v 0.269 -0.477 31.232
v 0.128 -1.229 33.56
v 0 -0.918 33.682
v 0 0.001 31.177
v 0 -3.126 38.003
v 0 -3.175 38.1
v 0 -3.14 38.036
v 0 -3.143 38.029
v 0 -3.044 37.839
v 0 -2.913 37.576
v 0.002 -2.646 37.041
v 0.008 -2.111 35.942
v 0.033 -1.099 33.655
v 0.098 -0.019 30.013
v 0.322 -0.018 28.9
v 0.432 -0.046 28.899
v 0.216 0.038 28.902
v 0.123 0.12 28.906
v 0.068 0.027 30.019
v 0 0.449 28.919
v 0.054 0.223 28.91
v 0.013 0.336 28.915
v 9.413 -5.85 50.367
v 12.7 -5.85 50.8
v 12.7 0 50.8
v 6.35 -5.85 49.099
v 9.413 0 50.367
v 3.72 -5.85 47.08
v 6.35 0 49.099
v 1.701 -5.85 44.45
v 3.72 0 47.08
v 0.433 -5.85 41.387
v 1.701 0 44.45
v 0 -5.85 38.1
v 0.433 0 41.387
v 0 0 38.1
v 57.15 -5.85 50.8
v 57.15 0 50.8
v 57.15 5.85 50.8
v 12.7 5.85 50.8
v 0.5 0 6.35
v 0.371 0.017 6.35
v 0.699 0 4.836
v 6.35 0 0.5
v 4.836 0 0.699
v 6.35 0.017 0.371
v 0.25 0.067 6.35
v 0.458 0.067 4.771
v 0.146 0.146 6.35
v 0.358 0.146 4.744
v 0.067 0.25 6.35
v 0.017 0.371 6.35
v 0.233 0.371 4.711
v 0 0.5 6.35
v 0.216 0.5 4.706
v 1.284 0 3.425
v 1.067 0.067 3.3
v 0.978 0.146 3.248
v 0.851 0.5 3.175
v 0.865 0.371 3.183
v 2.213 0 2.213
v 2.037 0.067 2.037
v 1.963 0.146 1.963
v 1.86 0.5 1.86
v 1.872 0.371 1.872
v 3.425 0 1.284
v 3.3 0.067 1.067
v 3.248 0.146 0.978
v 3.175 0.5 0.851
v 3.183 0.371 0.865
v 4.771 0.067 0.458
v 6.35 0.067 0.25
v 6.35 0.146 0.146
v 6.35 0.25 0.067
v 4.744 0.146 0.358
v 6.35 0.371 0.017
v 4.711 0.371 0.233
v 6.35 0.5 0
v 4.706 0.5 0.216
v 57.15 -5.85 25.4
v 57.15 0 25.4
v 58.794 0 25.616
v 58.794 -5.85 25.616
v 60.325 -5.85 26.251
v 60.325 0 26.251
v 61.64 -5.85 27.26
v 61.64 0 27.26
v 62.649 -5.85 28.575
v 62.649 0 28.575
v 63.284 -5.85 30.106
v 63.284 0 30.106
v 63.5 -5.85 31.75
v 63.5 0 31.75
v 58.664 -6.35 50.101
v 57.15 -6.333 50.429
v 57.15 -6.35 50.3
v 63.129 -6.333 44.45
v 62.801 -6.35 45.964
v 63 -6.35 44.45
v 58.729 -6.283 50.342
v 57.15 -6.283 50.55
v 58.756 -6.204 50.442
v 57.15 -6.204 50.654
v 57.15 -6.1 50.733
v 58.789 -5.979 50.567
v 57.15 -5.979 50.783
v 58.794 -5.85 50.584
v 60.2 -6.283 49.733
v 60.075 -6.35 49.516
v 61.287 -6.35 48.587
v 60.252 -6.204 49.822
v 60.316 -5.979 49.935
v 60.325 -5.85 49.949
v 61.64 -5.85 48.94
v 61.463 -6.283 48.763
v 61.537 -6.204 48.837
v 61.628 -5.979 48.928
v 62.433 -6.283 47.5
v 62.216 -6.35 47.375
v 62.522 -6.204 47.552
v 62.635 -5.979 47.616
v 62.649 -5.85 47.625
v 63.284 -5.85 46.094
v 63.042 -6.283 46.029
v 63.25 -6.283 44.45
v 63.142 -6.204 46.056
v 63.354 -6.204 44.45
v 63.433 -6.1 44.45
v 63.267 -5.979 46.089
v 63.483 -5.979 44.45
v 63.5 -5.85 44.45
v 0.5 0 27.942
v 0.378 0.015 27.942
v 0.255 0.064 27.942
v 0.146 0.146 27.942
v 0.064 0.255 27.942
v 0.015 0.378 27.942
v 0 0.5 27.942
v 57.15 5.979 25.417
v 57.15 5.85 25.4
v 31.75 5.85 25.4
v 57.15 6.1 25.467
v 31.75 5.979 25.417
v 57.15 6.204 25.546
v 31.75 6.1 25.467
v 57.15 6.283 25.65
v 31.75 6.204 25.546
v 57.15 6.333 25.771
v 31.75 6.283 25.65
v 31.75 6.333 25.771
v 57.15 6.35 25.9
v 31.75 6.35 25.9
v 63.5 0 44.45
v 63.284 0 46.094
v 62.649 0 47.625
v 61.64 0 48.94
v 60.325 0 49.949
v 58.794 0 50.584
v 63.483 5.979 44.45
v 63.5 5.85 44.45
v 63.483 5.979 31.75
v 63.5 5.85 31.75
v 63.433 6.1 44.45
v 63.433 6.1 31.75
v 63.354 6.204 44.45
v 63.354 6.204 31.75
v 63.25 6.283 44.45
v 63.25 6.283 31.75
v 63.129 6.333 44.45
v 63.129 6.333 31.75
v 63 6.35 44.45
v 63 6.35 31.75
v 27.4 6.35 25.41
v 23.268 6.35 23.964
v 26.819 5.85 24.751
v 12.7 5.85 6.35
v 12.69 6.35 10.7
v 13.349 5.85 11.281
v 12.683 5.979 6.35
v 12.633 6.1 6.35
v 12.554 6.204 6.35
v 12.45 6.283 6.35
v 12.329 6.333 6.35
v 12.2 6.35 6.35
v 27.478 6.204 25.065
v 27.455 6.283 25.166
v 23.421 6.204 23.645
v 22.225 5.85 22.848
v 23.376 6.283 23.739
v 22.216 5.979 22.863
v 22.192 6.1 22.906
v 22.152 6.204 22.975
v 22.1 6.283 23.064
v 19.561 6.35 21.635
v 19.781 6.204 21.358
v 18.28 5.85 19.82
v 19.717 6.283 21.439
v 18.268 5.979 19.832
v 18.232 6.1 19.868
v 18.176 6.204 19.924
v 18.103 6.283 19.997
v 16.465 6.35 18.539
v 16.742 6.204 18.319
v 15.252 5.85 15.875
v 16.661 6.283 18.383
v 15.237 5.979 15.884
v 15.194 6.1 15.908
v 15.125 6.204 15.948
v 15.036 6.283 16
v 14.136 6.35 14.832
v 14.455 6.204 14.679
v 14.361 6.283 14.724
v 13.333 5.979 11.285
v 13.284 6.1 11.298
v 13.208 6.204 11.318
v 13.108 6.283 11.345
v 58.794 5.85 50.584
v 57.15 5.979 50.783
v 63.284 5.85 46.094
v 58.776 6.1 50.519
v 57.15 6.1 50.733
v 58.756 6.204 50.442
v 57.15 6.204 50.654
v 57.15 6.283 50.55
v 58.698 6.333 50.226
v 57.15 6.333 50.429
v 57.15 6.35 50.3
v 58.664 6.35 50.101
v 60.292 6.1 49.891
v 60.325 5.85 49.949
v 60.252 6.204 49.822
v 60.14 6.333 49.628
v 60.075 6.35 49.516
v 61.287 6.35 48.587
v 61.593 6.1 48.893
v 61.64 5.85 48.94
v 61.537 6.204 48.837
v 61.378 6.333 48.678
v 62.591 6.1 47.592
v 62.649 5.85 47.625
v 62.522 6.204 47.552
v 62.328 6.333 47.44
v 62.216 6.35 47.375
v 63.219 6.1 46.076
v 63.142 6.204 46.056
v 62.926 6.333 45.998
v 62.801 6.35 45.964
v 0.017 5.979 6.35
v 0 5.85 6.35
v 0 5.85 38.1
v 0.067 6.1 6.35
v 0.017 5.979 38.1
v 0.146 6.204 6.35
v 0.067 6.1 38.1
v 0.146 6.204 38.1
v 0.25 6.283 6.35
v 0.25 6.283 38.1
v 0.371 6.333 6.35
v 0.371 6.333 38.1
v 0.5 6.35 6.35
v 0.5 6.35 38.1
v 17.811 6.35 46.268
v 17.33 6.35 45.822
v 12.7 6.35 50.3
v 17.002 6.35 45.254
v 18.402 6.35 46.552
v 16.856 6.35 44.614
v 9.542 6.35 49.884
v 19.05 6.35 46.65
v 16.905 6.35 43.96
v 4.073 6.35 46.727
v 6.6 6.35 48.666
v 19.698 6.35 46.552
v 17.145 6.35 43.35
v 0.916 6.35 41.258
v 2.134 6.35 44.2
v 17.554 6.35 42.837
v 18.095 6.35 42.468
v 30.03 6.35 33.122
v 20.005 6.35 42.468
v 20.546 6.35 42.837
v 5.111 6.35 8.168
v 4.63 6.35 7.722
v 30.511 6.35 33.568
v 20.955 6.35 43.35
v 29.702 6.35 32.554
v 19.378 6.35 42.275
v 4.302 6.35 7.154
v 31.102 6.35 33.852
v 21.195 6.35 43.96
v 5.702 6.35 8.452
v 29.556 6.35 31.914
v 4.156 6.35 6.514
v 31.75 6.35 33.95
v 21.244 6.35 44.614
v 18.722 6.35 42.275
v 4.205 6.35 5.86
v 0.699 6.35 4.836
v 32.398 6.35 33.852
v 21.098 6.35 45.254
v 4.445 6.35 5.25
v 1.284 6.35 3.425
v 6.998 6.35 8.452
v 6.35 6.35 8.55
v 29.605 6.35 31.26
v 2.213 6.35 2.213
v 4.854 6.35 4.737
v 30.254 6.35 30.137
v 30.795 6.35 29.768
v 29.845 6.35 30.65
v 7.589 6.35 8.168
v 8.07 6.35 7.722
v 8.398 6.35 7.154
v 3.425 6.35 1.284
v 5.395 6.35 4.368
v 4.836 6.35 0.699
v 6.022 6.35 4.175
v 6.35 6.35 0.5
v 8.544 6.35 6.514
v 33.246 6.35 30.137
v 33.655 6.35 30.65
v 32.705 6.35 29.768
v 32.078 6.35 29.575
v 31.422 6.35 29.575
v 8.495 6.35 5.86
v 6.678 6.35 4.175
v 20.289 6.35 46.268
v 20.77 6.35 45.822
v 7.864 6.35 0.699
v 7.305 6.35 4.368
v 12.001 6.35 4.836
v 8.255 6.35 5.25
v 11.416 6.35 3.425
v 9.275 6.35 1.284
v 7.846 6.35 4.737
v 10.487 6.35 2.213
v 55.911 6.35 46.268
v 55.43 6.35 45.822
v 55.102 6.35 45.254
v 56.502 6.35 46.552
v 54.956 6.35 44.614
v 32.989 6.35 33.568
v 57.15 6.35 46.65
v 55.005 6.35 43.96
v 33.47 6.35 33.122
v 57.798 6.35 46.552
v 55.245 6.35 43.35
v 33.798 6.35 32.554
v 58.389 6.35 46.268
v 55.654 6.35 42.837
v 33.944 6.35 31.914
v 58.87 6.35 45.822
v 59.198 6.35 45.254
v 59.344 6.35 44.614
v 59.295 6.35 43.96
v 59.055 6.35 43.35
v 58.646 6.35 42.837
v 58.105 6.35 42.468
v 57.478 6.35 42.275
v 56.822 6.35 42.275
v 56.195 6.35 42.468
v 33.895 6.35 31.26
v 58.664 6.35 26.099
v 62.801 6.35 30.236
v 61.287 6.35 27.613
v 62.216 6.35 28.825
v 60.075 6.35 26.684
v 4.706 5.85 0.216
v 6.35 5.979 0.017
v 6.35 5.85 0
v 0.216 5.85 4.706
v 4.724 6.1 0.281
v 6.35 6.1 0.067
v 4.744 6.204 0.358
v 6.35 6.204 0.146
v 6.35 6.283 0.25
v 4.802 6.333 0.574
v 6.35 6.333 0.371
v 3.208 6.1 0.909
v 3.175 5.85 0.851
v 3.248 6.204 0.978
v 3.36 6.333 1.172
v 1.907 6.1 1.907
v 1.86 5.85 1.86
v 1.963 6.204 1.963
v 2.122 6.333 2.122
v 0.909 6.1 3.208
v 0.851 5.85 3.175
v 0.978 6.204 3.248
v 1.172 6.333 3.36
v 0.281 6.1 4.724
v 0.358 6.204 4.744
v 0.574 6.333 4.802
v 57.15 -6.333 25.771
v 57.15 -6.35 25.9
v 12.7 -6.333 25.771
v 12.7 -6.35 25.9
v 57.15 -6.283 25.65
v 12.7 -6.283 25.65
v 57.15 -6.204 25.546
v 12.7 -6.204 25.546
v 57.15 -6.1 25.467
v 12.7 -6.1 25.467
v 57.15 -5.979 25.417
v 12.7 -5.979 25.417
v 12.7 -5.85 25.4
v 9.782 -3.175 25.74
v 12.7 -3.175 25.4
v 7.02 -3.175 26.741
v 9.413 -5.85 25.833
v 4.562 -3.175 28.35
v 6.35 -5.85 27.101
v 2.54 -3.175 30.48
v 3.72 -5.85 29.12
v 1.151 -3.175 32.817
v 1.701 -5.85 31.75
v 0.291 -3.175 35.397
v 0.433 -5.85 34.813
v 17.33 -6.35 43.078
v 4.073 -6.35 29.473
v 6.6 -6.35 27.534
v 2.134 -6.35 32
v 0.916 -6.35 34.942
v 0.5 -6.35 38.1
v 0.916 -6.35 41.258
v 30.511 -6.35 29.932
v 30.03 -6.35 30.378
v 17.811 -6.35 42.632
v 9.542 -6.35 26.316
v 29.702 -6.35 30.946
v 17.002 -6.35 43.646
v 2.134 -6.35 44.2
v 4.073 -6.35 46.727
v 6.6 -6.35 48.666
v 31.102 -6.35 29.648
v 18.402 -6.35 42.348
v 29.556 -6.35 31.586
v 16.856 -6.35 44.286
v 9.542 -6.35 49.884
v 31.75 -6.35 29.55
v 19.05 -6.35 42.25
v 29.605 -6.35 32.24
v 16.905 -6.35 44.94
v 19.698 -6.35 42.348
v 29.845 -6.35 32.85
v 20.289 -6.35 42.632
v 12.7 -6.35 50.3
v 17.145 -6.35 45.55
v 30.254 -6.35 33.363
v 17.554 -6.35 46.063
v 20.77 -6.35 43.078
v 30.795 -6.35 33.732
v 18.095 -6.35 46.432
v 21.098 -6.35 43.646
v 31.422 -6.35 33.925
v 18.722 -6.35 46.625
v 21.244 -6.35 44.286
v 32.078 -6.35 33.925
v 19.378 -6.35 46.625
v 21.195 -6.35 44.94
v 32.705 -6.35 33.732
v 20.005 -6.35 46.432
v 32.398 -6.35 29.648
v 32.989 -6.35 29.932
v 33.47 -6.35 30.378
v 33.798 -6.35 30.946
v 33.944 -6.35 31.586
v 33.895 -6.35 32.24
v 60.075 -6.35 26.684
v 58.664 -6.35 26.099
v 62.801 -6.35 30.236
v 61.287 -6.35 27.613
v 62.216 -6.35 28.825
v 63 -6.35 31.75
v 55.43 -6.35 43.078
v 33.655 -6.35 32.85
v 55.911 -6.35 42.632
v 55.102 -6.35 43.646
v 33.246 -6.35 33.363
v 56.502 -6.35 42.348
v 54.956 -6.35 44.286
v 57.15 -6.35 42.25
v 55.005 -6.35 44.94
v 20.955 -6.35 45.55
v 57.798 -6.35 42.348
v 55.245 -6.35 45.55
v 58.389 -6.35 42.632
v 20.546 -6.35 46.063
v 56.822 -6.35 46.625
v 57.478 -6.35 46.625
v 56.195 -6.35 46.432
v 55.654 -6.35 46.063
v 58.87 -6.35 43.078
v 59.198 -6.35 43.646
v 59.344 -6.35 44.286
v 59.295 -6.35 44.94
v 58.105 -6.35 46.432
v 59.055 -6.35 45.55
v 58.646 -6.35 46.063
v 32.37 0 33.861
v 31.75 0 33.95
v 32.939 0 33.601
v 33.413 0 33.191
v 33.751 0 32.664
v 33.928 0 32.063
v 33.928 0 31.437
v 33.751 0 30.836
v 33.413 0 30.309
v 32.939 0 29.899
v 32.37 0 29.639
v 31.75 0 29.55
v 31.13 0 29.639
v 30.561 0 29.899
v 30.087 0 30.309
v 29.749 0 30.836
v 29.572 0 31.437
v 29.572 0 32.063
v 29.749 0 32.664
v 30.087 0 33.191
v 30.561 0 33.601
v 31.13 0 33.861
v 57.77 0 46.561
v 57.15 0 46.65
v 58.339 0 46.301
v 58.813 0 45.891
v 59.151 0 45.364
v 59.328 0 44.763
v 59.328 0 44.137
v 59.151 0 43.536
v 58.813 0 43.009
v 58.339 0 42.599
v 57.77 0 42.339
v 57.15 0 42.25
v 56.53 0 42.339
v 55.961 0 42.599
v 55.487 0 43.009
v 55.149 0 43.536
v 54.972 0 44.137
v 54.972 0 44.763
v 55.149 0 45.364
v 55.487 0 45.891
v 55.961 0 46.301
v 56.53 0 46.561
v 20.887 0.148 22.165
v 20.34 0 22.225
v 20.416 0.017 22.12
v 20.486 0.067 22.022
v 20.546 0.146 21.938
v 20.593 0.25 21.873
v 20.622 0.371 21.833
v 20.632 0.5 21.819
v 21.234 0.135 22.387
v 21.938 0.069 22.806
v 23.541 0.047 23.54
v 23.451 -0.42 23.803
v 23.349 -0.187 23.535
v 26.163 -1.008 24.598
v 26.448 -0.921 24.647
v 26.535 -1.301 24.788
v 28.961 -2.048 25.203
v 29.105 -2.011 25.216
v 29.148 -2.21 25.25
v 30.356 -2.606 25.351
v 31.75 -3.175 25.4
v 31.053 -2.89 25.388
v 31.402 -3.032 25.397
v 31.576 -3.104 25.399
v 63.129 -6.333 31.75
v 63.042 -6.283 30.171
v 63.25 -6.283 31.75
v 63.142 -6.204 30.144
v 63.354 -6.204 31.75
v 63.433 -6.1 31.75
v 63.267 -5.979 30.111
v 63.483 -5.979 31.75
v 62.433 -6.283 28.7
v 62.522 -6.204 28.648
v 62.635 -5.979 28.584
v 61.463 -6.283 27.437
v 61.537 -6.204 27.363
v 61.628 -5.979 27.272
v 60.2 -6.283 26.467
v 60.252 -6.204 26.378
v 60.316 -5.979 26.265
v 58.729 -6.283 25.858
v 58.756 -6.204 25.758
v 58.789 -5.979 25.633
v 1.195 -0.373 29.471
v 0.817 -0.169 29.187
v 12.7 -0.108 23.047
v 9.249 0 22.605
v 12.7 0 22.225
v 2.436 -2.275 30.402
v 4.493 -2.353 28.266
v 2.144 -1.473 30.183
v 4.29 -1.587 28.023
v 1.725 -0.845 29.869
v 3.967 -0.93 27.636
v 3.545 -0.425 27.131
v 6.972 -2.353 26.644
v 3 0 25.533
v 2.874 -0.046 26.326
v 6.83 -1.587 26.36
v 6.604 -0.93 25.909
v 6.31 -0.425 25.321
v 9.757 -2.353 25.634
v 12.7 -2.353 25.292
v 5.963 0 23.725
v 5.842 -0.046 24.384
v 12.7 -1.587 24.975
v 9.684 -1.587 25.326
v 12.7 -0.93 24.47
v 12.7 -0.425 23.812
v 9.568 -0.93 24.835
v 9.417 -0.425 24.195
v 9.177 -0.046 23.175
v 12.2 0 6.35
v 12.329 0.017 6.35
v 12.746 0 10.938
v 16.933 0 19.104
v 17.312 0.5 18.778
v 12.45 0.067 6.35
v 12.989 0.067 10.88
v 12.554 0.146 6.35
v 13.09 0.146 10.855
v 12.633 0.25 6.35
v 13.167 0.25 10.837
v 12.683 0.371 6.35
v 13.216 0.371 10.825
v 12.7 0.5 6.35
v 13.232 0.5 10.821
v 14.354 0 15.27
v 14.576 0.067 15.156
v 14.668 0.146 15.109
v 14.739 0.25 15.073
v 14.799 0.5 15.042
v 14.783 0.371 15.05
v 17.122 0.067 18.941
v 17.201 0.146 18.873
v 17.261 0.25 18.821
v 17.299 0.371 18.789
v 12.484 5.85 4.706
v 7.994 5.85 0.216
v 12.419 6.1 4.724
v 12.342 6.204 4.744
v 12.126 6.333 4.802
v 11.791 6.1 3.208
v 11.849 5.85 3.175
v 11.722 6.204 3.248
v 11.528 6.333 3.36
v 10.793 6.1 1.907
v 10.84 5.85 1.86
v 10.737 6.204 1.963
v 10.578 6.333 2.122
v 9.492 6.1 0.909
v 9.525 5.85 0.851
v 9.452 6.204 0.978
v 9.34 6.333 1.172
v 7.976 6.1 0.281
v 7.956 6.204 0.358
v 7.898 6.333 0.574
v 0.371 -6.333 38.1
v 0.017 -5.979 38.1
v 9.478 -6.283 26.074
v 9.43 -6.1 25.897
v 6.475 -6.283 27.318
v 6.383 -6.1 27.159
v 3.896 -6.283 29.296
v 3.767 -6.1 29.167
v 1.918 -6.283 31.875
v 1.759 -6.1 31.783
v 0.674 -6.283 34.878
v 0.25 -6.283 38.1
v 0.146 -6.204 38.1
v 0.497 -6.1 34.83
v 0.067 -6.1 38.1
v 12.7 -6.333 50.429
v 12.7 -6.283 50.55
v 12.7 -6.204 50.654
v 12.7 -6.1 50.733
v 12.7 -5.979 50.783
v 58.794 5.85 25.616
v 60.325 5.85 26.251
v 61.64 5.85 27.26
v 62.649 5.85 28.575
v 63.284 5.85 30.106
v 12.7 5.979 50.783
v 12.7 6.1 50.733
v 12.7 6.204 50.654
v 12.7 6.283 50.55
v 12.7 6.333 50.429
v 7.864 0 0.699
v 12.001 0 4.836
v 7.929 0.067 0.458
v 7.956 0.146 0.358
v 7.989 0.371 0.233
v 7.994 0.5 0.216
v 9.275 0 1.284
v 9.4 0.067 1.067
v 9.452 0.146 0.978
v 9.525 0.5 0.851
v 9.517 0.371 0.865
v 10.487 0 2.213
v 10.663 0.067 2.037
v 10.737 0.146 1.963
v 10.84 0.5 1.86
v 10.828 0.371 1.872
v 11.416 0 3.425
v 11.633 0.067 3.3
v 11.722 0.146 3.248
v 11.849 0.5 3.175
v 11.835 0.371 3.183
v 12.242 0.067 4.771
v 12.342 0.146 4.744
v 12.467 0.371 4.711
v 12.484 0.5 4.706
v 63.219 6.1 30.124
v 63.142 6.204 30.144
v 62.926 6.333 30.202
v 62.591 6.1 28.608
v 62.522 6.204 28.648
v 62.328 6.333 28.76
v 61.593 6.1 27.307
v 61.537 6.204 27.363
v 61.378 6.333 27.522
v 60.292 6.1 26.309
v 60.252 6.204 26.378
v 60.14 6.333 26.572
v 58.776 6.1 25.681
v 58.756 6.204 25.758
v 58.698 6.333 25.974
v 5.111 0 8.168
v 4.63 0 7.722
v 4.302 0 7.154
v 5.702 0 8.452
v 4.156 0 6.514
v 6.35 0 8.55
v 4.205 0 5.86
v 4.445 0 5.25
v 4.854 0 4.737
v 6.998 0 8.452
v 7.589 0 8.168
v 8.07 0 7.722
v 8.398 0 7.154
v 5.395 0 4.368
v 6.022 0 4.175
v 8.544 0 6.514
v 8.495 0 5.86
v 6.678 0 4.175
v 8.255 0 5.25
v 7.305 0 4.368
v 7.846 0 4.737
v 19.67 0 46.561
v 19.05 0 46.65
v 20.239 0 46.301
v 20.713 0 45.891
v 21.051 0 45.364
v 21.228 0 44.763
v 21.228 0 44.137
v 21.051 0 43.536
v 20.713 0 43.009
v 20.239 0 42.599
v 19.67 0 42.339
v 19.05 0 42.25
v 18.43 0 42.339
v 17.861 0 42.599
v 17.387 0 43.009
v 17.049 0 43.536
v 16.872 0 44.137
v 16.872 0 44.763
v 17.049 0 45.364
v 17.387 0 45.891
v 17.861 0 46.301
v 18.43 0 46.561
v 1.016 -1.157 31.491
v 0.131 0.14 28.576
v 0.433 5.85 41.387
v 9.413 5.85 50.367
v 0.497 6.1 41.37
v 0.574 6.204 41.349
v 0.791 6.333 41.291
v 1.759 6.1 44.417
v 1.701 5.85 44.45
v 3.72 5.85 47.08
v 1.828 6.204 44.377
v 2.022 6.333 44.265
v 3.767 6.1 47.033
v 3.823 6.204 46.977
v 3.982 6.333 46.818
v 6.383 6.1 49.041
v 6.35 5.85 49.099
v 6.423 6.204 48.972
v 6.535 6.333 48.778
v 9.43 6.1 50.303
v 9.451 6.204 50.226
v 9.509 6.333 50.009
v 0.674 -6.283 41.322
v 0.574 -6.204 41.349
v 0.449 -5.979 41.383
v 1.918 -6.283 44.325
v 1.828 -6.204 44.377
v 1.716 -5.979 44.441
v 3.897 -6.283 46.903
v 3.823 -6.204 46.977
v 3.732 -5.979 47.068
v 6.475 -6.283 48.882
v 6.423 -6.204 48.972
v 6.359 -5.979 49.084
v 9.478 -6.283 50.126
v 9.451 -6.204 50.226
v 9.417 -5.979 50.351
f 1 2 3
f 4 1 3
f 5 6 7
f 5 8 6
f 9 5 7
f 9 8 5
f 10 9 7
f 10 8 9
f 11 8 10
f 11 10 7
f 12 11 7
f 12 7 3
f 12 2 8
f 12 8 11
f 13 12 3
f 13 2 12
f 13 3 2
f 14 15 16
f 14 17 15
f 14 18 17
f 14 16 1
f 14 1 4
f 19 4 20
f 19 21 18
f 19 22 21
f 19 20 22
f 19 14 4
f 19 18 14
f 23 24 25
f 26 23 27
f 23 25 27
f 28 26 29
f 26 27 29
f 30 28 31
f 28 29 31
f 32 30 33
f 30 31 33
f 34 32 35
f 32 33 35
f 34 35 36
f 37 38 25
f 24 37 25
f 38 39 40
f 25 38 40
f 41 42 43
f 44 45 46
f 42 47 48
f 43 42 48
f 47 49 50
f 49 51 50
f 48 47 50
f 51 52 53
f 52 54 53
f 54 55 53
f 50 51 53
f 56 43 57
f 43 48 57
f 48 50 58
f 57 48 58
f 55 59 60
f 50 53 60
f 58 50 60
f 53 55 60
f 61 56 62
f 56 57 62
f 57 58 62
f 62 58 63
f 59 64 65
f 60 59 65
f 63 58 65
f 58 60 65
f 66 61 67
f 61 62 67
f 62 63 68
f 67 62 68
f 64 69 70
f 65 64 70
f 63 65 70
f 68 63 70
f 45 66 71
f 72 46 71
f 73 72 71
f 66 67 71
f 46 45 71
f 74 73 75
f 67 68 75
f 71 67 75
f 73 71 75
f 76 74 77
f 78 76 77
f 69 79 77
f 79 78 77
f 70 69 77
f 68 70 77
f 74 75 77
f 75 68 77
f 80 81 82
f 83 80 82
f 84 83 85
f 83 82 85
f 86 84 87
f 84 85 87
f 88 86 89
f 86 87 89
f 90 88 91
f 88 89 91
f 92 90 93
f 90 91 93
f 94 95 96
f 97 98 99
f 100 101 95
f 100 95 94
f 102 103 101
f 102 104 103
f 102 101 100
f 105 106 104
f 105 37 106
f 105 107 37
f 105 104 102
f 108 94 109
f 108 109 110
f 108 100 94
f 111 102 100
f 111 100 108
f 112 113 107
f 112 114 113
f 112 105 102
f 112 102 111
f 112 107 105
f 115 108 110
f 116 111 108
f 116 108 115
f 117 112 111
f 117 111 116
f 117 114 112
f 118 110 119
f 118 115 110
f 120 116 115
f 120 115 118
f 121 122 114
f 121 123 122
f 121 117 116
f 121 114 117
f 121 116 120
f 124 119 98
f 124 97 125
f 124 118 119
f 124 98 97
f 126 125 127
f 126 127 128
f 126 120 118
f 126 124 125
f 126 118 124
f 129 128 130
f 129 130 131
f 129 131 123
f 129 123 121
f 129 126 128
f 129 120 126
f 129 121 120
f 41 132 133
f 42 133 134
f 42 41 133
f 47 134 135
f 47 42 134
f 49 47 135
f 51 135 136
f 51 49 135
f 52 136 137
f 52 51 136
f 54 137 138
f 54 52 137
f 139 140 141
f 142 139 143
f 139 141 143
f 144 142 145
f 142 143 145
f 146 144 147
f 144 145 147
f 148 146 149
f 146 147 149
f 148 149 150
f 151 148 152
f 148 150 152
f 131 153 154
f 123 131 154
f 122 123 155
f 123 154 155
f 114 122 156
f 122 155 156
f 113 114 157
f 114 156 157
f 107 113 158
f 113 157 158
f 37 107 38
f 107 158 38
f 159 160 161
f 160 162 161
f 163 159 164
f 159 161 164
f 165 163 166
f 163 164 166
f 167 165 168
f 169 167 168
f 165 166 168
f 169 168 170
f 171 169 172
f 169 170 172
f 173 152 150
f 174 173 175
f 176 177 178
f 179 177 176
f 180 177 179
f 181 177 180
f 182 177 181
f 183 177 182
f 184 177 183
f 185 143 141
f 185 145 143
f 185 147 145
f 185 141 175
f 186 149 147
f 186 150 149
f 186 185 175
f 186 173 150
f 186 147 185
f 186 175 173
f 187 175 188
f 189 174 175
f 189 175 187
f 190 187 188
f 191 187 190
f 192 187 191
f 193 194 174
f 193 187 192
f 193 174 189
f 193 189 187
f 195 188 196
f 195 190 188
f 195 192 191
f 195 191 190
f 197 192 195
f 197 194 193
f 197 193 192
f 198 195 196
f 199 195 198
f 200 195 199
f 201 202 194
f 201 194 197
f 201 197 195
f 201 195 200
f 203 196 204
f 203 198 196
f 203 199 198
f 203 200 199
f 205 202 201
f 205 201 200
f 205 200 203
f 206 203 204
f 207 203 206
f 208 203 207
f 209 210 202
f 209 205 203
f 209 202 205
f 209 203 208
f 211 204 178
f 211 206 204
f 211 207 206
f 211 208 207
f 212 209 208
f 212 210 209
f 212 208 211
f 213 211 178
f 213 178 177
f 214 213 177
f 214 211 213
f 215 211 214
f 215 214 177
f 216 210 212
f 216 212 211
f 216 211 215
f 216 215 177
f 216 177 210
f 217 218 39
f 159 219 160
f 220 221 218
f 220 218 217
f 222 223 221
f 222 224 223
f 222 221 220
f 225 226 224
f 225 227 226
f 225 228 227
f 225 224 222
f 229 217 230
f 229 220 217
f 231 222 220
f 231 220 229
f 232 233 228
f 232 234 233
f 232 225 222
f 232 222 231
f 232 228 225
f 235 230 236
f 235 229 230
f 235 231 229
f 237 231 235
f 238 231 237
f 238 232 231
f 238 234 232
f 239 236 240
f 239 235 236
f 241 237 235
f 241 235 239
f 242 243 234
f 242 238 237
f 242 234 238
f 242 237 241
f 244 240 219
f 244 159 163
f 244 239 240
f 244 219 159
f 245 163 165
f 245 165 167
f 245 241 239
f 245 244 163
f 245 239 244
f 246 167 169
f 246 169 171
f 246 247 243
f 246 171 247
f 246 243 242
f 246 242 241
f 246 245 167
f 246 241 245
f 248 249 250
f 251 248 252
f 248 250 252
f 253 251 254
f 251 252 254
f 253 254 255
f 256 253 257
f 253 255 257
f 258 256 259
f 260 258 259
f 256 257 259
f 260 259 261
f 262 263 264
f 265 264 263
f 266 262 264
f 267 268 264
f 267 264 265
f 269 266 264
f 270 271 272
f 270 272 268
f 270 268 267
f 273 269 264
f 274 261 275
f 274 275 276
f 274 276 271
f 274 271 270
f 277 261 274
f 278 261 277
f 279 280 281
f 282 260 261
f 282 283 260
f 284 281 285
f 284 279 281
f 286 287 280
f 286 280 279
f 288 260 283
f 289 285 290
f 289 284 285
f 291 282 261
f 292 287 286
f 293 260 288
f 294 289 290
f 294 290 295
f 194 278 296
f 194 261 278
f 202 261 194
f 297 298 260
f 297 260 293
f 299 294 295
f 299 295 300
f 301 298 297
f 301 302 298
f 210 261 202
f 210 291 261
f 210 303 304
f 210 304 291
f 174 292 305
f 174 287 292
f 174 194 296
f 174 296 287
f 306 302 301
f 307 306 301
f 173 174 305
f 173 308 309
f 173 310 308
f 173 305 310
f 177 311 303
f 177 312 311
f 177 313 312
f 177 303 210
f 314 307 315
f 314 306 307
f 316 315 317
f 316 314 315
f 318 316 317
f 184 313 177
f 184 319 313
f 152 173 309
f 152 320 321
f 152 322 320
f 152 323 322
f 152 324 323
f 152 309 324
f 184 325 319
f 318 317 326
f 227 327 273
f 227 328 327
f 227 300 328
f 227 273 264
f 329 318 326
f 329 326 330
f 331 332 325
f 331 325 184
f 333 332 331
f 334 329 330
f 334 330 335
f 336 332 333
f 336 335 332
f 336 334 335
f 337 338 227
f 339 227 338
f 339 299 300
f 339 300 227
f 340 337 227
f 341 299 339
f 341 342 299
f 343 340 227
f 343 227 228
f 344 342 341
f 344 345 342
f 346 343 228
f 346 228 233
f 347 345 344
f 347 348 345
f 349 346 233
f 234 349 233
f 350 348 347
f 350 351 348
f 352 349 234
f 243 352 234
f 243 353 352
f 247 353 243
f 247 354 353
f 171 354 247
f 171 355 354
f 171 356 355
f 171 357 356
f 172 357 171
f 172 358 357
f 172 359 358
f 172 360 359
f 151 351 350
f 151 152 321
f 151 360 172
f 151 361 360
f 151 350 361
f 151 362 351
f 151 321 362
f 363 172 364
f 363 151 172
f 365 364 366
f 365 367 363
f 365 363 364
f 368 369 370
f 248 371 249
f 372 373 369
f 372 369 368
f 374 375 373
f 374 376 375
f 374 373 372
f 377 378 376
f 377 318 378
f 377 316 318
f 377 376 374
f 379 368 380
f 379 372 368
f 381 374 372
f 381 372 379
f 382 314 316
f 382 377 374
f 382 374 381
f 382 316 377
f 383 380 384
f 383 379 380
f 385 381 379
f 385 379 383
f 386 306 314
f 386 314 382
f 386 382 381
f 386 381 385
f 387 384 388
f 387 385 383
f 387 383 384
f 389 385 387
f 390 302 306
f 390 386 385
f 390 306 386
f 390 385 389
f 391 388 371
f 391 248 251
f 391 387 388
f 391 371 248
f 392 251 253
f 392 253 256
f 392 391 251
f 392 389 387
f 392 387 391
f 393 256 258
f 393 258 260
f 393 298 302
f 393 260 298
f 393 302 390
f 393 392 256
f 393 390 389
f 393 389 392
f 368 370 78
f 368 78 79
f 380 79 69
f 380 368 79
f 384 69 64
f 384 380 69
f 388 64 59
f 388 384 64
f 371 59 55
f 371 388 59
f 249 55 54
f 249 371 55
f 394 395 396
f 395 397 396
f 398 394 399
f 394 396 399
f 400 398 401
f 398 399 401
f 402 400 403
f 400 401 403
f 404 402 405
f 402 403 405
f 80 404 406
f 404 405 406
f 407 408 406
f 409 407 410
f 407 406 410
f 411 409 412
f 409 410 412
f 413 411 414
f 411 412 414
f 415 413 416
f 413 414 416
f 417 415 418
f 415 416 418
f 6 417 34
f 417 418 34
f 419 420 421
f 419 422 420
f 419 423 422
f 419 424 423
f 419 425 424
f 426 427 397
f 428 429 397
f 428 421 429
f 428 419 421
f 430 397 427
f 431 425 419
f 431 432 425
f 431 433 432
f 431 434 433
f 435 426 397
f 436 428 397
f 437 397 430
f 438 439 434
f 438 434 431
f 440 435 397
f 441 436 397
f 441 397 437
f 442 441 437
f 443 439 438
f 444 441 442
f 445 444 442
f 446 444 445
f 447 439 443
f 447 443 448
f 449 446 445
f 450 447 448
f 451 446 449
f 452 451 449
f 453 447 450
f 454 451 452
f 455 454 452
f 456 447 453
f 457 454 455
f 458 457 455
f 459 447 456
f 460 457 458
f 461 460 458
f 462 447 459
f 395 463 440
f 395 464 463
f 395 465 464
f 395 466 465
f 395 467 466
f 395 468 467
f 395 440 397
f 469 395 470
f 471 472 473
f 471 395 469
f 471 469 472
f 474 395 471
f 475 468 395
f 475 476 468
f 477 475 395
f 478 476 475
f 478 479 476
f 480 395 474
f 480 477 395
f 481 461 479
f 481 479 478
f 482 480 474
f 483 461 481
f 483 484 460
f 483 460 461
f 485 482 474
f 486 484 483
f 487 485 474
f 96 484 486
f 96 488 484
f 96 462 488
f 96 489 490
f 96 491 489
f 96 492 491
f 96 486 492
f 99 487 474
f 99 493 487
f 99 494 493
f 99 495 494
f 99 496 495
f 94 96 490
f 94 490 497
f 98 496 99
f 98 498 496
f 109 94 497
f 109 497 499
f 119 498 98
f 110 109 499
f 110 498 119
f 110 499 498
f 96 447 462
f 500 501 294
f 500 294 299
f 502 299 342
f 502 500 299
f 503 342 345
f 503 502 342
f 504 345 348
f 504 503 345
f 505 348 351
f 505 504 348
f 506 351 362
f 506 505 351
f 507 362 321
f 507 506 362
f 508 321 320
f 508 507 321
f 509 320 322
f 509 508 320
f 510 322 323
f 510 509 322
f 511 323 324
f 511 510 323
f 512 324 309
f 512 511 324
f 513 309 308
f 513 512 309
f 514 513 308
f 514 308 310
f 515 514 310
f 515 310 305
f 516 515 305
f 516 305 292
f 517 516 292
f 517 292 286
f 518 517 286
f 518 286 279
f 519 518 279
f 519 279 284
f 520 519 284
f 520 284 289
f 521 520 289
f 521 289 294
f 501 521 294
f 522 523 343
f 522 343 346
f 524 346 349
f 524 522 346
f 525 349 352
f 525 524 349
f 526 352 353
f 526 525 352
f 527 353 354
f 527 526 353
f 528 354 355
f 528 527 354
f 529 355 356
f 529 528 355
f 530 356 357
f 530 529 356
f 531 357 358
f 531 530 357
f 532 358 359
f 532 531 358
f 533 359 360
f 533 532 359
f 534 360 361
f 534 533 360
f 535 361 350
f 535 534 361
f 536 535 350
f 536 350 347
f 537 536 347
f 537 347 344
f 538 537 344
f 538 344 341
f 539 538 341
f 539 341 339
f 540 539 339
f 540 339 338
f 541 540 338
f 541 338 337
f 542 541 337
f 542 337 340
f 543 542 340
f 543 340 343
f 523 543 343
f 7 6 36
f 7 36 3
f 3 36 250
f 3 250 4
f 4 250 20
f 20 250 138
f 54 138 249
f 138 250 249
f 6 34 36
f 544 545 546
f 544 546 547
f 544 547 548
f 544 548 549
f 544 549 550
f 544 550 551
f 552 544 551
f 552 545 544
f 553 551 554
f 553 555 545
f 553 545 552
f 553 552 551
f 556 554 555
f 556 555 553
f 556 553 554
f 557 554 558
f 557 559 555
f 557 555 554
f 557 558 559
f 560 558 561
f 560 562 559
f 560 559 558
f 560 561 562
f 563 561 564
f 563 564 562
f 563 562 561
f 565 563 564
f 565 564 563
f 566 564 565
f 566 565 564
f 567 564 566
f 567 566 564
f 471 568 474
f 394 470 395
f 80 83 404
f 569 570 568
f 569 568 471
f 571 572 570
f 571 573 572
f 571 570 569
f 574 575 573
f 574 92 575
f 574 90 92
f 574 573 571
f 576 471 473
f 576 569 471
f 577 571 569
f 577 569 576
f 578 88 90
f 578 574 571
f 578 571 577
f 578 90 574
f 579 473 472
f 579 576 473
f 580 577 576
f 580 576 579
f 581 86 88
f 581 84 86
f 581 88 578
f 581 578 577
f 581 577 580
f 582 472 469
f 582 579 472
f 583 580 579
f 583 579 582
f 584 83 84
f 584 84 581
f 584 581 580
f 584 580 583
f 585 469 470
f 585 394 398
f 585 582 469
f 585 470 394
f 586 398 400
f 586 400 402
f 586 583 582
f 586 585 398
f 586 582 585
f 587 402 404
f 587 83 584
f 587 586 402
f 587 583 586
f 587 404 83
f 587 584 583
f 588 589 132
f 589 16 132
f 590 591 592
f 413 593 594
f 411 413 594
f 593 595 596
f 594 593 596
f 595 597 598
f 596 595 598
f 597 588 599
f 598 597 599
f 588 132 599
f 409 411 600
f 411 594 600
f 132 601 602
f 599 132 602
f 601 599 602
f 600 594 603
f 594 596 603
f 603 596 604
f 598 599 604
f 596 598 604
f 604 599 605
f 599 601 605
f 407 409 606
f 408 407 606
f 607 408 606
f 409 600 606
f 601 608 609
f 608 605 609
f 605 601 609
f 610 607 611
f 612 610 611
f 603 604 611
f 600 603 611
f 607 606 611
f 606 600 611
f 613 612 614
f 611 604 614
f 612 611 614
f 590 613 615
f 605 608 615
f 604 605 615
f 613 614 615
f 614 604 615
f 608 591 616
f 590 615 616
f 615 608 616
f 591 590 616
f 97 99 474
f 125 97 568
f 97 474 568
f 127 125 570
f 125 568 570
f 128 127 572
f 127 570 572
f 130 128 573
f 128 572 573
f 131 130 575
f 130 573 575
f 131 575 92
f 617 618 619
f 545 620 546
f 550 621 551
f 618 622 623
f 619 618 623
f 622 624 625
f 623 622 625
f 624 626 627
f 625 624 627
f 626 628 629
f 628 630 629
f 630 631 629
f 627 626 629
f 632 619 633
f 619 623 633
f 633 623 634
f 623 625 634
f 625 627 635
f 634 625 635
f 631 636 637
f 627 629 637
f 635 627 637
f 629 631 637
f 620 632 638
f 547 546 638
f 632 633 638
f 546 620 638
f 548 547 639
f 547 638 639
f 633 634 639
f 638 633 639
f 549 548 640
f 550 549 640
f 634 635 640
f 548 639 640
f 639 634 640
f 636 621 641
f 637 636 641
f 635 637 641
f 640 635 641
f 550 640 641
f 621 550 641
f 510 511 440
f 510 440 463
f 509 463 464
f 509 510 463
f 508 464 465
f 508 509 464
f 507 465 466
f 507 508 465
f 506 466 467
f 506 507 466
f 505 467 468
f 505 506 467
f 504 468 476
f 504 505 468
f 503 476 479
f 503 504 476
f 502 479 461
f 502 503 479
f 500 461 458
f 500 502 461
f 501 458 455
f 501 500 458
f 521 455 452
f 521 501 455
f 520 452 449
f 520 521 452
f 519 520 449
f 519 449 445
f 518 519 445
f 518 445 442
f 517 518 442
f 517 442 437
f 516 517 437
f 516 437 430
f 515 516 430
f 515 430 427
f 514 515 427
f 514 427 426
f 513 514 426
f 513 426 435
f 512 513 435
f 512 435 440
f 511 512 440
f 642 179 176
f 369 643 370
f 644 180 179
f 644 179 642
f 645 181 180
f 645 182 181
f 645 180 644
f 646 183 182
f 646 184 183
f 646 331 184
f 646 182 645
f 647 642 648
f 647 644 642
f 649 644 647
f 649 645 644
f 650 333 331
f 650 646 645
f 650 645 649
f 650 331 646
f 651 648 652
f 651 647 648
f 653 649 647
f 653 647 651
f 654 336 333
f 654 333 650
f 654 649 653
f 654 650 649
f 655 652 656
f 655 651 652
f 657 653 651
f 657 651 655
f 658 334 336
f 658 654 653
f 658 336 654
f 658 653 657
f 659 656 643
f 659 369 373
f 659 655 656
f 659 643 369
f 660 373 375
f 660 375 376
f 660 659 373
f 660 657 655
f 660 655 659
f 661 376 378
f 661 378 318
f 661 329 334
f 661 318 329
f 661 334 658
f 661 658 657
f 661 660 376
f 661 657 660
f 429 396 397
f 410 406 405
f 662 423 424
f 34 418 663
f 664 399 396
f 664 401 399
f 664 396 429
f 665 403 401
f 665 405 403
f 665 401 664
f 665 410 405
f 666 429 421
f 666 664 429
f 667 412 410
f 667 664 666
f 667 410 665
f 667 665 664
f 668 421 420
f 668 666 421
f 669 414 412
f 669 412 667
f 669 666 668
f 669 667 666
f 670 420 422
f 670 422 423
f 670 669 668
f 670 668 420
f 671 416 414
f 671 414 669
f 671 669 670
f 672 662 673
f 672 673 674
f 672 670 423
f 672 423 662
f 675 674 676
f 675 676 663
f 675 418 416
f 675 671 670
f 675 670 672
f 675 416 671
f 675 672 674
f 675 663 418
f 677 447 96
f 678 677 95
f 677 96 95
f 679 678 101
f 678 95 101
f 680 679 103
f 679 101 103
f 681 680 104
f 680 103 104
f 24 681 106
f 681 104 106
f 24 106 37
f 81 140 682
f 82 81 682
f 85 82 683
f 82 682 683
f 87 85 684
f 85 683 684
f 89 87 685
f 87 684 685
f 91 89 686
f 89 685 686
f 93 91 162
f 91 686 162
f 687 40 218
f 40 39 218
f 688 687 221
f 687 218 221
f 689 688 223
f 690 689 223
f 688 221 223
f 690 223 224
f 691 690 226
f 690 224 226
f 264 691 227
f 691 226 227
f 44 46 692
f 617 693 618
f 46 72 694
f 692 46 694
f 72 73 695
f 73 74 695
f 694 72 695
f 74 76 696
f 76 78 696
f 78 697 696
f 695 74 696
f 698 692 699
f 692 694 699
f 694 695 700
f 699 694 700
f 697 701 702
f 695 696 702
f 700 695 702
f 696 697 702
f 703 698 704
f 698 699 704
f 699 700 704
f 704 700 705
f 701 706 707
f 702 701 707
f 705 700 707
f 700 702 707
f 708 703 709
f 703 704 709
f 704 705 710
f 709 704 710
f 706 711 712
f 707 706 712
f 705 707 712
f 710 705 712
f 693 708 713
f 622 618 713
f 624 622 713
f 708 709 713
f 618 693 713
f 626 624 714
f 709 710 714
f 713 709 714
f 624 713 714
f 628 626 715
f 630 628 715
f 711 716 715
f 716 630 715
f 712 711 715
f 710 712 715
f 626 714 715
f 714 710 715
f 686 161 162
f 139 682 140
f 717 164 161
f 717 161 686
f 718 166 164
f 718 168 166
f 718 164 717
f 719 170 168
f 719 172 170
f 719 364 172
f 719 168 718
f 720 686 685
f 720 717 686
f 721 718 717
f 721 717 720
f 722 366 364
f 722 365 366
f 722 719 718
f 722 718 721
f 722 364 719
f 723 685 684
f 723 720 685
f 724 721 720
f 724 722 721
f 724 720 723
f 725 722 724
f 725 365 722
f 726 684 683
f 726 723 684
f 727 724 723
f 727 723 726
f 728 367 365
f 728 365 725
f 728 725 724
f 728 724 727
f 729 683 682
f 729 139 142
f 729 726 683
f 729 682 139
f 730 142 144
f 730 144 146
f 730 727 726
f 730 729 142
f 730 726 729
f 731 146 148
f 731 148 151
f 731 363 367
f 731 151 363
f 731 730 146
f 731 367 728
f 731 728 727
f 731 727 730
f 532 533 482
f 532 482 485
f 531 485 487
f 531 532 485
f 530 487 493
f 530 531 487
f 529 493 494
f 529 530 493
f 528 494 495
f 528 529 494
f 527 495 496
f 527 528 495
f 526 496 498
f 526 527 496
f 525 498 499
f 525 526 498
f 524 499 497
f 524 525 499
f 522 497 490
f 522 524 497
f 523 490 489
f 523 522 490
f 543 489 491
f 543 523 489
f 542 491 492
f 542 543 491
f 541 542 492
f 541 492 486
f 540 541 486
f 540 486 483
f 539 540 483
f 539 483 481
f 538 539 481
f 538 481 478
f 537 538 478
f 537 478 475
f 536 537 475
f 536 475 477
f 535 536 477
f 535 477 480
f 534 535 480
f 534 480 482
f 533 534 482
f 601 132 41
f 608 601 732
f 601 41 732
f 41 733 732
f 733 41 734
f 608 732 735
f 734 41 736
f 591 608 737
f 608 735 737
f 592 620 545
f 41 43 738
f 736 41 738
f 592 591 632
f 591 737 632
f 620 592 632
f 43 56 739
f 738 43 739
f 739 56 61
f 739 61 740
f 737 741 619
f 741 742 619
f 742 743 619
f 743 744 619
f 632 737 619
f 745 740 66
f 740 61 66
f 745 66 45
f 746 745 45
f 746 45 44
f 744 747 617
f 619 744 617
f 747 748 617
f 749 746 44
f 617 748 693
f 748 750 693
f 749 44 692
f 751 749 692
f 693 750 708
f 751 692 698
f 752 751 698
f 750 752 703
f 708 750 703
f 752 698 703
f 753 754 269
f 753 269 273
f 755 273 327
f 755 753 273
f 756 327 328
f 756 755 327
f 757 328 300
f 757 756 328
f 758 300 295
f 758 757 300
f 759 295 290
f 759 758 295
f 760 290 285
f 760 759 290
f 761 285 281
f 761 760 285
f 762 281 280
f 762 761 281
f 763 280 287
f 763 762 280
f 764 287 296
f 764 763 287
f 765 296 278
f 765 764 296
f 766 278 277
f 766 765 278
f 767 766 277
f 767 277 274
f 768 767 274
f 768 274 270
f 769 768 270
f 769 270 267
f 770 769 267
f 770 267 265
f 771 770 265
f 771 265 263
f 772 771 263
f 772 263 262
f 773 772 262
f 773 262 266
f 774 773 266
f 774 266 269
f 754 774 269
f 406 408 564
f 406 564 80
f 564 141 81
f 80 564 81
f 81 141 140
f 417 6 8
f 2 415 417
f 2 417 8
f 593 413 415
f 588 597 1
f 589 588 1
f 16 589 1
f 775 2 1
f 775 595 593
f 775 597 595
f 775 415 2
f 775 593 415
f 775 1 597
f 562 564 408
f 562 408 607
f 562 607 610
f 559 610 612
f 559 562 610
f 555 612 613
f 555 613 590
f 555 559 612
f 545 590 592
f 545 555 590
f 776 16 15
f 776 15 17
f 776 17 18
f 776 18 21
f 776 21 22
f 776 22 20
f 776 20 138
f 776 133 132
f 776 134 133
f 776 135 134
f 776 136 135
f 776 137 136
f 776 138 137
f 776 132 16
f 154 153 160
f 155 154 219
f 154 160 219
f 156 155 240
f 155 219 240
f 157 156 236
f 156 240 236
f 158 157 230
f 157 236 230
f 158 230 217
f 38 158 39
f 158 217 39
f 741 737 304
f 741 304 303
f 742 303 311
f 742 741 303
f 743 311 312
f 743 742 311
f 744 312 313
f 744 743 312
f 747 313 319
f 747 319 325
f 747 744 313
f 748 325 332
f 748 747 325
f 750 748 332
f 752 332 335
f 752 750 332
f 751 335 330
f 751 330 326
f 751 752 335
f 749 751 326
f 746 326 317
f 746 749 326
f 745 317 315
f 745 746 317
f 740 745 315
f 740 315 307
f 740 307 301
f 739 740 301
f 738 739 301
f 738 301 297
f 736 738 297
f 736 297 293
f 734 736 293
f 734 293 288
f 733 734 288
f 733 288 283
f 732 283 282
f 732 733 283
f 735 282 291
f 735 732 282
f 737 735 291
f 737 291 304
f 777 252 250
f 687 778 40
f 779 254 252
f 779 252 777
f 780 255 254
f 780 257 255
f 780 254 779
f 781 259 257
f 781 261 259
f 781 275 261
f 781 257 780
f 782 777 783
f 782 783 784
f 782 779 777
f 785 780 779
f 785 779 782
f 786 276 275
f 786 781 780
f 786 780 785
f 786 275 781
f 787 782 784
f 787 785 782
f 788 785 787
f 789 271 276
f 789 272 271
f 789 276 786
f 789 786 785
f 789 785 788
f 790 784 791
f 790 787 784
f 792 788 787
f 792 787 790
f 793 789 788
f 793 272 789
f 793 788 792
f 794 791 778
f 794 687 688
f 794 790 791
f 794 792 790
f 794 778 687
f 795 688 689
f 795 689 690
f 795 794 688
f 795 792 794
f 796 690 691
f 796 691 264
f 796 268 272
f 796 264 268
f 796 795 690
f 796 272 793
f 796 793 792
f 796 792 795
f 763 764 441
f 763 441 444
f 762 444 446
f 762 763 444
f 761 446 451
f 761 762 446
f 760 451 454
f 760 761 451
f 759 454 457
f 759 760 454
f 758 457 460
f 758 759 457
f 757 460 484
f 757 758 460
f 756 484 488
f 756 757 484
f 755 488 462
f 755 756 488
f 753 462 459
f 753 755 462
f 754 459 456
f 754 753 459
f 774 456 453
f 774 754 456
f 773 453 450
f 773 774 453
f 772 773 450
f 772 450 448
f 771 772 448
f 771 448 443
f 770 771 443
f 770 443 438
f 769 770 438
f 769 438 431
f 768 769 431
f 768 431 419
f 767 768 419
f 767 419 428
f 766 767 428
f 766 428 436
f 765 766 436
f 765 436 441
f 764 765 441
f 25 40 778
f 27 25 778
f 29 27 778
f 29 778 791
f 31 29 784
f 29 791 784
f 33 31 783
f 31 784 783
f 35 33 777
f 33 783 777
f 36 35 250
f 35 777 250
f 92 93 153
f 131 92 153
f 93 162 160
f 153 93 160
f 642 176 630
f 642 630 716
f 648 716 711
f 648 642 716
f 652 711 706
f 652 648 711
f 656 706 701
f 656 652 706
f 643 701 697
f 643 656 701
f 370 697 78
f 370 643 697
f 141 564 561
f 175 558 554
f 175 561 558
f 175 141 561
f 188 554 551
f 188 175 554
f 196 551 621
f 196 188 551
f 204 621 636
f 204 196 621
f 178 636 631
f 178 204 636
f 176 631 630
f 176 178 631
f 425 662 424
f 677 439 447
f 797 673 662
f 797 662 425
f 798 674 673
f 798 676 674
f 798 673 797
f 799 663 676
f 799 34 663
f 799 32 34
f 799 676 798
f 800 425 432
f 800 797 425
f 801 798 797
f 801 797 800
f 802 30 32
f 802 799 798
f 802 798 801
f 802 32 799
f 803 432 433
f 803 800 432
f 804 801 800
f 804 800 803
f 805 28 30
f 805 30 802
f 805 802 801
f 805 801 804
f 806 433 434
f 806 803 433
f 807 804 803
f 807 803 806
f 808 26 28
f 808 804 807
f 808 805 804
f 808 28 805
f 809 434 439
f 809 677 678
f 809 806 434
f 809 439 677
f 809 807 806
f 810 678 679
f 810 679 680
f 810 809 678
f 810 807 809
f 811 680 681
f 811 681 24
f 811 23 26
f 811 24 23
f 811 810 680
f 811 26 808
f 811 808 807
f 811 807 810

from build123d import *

# Parameters (mm, degrees)
SKETCH1_R           = 2.2
BOSS_EXTRUDE1_DEPTH = 6.35
FILLET3_R           = 19.05
FILLET4_R           = 6.35
FILLET5_R           = 6.35
FILLET10_R          = 12.7
SKETCH3_R           = 2.2
BOSS_EXTRUDE3_DEPTH = 6.35
FILLET6_R           = 12.7
FILLET8_R           = 3.175
FILLET9_R           = 0.5


with BuildPart() as part:
    # Sketch1 → Boss-Extrude1 (new body)
    with BuildSketch(Plane(origin=(0, 0, 0), x_dir=(1, 0, 0), z_dir=(0, 1, 0))):
        Polygon((63.5, -25.4), (12.7, -25.4), (12.7, 0), (0, 0), (0, -50.8), (63.5, -50.8), align=None)
        with Locations(Location((6.35, -6.35, 0), (0, 0, 270))):
            Circle(SKETCH1_R, mode=Mode.SUBTRACT)
        with Locations(Location((31.75, -31.75, 0), (0, 0, 270))):
            Circle(SKETCH1_R, mode=Mode.SUBTRACT)
        with Locations(Location((57.15, -44.45, 0), (0, 0, 270))):
            Circle(SKETCH1_R, mode=Mode.SUBTRACT)
        with Locations(Location((19.05, -44.45, 0), (0, 0, 270))):
            Circle(SKETCH1_R, mode=Mode.SUBTRACT)
    extrude(amount=BOSS_EXTRUDE1_DEPTH)

    # Fillet3
    fillet3_edges = [part.edges().sort_by_distance(p)[0] for p in [
        (12.7, 3.175, 25.4),
    ]]
    fillet(fillet3_edges, radius=FILLET3_R)

    # Fillet4
    fillet4_edges = [part.edges().sort_by_distance(p)[0] for p in [
        (0, 3.175, 0),
        (12.7, 3.175, 0),
    ]]
    fillet(fillet4_edges, radius=FILLET4_R - 0.0001)  # a hair under: the kernel refuses the full size

    # Fillet5
    fillet5_edges = [part.edges().sort_by_distance(p)[0] for p in [
        (63.5, 3.175, 25.4),
        (63.5, 3.175, 50.8),
    ]]
    fillet(fillet5_edges, radius=FILLET5_R)

    # Fillet10
    fillet10_edges = [part.edges().sort_by_distance(p)[0] for p in [
        (0, 3.175, 50.8),
    ]]
    fillet(fillet10_edges, radius=FILLET10_R)

    # Sketch3 → Boss-Extrude3 (add)
    with BuildSketch(Plane.XZ):
        with BuildLine():
            Line((0, 25.4), (31.75, 25.4))
            Line((31.75, 25.4), (57.15, 25.4))
            ThreePointArc((57.15, 25.4), (61.640128061, 27.259871939), (63.5, 31.75))
            Line((63.5, 31.75), (63.5, 44.45))
            ThreePointArc((63.5, 44.45), (61.640128061, 48.940128061), (57.15, 50.8))
            Line((57.15, 50.8), (12.7, 50.8))
            ThreePointArc((12.7, 50.8), (3.719743879, 47.080256121), (0, 38.1))
            Line((0, 38.1), (0, 25.4))
        make_face()
        with Locations(Location((19.05, 44.45, 0), (0, 0, 270))):
            Circle(SKETCH3_R, mode=Mode.SUBTRACT)
        with Locations(Location((31.75, 31.75, 0), (0, 0, 270))):
            Circle(SKETCH3_R, mode=Mode.SUBTRACT)
        with Locations(Location((57.15, 44.45, 0), (0, 0, 270))):
            Circle(SKETCH3_R, mode=Mode.SUBTRACT)
    extrude(amount=BOSS_EXTRUDE3_DEPTH)

    # Fillet6
    fillet6_edges = [part.edges().sort_by_distance(p)[0] for p in [
        (0, -3.175, 25.4),
    ]]
    fillet(fillet6_edges, radius=FILLET6_R - 0.0001)  # a hair under: the kernel refuses the full size

    # Fillet8
    fillet8_edges = [part.edges().sort_by_distance(p)[0] for p in [
        (22.22495, 0, 25.4),
    ]]
    fillet(fillet8_edges, radius=FILLET8_R)

    # Fillet9
    fillet9_edges = [part.edges().sort_by_distance(p)[0] for p in [
        (3.71971459, -6.35, 29.11971459),
        (18.279615818, 6.35, 19.820384182),
        (0, 0, 17.462416667),
        (1.85984265, 0, 1.85984265),
        (10.84015735, 0, 1.85984265),
        (0, 6.35, 22.22495),
        (1.85984265, 6.35, 1.85984265),
        (10.84015735, 6.35, 1.85984265),
        (63.5, 6.35, 38.1),
        (44.45, 6.35, 25.4),
        (61.640128061, 6.35, 27.259871939),
        (61.640128061, 6.35, 48.940128061),
        (34.925, 6.35, 50.8),
        (3.719743879, 6.35, 47.080256121),
        (34.92495, -6.35, 25.4),
        (61.640128061, -6.35, 27.259871939),
        (63.5, -6.35, 38.1),
        (61.640128061, -6.35, 48.940128061),
        (34.925, -6.35, 50.8),
        (3.719743879, -6.35, 47.080256121),
    ]]
    fillet(fillet9_edges, radius=FILLET9_R)


solid = part.part
